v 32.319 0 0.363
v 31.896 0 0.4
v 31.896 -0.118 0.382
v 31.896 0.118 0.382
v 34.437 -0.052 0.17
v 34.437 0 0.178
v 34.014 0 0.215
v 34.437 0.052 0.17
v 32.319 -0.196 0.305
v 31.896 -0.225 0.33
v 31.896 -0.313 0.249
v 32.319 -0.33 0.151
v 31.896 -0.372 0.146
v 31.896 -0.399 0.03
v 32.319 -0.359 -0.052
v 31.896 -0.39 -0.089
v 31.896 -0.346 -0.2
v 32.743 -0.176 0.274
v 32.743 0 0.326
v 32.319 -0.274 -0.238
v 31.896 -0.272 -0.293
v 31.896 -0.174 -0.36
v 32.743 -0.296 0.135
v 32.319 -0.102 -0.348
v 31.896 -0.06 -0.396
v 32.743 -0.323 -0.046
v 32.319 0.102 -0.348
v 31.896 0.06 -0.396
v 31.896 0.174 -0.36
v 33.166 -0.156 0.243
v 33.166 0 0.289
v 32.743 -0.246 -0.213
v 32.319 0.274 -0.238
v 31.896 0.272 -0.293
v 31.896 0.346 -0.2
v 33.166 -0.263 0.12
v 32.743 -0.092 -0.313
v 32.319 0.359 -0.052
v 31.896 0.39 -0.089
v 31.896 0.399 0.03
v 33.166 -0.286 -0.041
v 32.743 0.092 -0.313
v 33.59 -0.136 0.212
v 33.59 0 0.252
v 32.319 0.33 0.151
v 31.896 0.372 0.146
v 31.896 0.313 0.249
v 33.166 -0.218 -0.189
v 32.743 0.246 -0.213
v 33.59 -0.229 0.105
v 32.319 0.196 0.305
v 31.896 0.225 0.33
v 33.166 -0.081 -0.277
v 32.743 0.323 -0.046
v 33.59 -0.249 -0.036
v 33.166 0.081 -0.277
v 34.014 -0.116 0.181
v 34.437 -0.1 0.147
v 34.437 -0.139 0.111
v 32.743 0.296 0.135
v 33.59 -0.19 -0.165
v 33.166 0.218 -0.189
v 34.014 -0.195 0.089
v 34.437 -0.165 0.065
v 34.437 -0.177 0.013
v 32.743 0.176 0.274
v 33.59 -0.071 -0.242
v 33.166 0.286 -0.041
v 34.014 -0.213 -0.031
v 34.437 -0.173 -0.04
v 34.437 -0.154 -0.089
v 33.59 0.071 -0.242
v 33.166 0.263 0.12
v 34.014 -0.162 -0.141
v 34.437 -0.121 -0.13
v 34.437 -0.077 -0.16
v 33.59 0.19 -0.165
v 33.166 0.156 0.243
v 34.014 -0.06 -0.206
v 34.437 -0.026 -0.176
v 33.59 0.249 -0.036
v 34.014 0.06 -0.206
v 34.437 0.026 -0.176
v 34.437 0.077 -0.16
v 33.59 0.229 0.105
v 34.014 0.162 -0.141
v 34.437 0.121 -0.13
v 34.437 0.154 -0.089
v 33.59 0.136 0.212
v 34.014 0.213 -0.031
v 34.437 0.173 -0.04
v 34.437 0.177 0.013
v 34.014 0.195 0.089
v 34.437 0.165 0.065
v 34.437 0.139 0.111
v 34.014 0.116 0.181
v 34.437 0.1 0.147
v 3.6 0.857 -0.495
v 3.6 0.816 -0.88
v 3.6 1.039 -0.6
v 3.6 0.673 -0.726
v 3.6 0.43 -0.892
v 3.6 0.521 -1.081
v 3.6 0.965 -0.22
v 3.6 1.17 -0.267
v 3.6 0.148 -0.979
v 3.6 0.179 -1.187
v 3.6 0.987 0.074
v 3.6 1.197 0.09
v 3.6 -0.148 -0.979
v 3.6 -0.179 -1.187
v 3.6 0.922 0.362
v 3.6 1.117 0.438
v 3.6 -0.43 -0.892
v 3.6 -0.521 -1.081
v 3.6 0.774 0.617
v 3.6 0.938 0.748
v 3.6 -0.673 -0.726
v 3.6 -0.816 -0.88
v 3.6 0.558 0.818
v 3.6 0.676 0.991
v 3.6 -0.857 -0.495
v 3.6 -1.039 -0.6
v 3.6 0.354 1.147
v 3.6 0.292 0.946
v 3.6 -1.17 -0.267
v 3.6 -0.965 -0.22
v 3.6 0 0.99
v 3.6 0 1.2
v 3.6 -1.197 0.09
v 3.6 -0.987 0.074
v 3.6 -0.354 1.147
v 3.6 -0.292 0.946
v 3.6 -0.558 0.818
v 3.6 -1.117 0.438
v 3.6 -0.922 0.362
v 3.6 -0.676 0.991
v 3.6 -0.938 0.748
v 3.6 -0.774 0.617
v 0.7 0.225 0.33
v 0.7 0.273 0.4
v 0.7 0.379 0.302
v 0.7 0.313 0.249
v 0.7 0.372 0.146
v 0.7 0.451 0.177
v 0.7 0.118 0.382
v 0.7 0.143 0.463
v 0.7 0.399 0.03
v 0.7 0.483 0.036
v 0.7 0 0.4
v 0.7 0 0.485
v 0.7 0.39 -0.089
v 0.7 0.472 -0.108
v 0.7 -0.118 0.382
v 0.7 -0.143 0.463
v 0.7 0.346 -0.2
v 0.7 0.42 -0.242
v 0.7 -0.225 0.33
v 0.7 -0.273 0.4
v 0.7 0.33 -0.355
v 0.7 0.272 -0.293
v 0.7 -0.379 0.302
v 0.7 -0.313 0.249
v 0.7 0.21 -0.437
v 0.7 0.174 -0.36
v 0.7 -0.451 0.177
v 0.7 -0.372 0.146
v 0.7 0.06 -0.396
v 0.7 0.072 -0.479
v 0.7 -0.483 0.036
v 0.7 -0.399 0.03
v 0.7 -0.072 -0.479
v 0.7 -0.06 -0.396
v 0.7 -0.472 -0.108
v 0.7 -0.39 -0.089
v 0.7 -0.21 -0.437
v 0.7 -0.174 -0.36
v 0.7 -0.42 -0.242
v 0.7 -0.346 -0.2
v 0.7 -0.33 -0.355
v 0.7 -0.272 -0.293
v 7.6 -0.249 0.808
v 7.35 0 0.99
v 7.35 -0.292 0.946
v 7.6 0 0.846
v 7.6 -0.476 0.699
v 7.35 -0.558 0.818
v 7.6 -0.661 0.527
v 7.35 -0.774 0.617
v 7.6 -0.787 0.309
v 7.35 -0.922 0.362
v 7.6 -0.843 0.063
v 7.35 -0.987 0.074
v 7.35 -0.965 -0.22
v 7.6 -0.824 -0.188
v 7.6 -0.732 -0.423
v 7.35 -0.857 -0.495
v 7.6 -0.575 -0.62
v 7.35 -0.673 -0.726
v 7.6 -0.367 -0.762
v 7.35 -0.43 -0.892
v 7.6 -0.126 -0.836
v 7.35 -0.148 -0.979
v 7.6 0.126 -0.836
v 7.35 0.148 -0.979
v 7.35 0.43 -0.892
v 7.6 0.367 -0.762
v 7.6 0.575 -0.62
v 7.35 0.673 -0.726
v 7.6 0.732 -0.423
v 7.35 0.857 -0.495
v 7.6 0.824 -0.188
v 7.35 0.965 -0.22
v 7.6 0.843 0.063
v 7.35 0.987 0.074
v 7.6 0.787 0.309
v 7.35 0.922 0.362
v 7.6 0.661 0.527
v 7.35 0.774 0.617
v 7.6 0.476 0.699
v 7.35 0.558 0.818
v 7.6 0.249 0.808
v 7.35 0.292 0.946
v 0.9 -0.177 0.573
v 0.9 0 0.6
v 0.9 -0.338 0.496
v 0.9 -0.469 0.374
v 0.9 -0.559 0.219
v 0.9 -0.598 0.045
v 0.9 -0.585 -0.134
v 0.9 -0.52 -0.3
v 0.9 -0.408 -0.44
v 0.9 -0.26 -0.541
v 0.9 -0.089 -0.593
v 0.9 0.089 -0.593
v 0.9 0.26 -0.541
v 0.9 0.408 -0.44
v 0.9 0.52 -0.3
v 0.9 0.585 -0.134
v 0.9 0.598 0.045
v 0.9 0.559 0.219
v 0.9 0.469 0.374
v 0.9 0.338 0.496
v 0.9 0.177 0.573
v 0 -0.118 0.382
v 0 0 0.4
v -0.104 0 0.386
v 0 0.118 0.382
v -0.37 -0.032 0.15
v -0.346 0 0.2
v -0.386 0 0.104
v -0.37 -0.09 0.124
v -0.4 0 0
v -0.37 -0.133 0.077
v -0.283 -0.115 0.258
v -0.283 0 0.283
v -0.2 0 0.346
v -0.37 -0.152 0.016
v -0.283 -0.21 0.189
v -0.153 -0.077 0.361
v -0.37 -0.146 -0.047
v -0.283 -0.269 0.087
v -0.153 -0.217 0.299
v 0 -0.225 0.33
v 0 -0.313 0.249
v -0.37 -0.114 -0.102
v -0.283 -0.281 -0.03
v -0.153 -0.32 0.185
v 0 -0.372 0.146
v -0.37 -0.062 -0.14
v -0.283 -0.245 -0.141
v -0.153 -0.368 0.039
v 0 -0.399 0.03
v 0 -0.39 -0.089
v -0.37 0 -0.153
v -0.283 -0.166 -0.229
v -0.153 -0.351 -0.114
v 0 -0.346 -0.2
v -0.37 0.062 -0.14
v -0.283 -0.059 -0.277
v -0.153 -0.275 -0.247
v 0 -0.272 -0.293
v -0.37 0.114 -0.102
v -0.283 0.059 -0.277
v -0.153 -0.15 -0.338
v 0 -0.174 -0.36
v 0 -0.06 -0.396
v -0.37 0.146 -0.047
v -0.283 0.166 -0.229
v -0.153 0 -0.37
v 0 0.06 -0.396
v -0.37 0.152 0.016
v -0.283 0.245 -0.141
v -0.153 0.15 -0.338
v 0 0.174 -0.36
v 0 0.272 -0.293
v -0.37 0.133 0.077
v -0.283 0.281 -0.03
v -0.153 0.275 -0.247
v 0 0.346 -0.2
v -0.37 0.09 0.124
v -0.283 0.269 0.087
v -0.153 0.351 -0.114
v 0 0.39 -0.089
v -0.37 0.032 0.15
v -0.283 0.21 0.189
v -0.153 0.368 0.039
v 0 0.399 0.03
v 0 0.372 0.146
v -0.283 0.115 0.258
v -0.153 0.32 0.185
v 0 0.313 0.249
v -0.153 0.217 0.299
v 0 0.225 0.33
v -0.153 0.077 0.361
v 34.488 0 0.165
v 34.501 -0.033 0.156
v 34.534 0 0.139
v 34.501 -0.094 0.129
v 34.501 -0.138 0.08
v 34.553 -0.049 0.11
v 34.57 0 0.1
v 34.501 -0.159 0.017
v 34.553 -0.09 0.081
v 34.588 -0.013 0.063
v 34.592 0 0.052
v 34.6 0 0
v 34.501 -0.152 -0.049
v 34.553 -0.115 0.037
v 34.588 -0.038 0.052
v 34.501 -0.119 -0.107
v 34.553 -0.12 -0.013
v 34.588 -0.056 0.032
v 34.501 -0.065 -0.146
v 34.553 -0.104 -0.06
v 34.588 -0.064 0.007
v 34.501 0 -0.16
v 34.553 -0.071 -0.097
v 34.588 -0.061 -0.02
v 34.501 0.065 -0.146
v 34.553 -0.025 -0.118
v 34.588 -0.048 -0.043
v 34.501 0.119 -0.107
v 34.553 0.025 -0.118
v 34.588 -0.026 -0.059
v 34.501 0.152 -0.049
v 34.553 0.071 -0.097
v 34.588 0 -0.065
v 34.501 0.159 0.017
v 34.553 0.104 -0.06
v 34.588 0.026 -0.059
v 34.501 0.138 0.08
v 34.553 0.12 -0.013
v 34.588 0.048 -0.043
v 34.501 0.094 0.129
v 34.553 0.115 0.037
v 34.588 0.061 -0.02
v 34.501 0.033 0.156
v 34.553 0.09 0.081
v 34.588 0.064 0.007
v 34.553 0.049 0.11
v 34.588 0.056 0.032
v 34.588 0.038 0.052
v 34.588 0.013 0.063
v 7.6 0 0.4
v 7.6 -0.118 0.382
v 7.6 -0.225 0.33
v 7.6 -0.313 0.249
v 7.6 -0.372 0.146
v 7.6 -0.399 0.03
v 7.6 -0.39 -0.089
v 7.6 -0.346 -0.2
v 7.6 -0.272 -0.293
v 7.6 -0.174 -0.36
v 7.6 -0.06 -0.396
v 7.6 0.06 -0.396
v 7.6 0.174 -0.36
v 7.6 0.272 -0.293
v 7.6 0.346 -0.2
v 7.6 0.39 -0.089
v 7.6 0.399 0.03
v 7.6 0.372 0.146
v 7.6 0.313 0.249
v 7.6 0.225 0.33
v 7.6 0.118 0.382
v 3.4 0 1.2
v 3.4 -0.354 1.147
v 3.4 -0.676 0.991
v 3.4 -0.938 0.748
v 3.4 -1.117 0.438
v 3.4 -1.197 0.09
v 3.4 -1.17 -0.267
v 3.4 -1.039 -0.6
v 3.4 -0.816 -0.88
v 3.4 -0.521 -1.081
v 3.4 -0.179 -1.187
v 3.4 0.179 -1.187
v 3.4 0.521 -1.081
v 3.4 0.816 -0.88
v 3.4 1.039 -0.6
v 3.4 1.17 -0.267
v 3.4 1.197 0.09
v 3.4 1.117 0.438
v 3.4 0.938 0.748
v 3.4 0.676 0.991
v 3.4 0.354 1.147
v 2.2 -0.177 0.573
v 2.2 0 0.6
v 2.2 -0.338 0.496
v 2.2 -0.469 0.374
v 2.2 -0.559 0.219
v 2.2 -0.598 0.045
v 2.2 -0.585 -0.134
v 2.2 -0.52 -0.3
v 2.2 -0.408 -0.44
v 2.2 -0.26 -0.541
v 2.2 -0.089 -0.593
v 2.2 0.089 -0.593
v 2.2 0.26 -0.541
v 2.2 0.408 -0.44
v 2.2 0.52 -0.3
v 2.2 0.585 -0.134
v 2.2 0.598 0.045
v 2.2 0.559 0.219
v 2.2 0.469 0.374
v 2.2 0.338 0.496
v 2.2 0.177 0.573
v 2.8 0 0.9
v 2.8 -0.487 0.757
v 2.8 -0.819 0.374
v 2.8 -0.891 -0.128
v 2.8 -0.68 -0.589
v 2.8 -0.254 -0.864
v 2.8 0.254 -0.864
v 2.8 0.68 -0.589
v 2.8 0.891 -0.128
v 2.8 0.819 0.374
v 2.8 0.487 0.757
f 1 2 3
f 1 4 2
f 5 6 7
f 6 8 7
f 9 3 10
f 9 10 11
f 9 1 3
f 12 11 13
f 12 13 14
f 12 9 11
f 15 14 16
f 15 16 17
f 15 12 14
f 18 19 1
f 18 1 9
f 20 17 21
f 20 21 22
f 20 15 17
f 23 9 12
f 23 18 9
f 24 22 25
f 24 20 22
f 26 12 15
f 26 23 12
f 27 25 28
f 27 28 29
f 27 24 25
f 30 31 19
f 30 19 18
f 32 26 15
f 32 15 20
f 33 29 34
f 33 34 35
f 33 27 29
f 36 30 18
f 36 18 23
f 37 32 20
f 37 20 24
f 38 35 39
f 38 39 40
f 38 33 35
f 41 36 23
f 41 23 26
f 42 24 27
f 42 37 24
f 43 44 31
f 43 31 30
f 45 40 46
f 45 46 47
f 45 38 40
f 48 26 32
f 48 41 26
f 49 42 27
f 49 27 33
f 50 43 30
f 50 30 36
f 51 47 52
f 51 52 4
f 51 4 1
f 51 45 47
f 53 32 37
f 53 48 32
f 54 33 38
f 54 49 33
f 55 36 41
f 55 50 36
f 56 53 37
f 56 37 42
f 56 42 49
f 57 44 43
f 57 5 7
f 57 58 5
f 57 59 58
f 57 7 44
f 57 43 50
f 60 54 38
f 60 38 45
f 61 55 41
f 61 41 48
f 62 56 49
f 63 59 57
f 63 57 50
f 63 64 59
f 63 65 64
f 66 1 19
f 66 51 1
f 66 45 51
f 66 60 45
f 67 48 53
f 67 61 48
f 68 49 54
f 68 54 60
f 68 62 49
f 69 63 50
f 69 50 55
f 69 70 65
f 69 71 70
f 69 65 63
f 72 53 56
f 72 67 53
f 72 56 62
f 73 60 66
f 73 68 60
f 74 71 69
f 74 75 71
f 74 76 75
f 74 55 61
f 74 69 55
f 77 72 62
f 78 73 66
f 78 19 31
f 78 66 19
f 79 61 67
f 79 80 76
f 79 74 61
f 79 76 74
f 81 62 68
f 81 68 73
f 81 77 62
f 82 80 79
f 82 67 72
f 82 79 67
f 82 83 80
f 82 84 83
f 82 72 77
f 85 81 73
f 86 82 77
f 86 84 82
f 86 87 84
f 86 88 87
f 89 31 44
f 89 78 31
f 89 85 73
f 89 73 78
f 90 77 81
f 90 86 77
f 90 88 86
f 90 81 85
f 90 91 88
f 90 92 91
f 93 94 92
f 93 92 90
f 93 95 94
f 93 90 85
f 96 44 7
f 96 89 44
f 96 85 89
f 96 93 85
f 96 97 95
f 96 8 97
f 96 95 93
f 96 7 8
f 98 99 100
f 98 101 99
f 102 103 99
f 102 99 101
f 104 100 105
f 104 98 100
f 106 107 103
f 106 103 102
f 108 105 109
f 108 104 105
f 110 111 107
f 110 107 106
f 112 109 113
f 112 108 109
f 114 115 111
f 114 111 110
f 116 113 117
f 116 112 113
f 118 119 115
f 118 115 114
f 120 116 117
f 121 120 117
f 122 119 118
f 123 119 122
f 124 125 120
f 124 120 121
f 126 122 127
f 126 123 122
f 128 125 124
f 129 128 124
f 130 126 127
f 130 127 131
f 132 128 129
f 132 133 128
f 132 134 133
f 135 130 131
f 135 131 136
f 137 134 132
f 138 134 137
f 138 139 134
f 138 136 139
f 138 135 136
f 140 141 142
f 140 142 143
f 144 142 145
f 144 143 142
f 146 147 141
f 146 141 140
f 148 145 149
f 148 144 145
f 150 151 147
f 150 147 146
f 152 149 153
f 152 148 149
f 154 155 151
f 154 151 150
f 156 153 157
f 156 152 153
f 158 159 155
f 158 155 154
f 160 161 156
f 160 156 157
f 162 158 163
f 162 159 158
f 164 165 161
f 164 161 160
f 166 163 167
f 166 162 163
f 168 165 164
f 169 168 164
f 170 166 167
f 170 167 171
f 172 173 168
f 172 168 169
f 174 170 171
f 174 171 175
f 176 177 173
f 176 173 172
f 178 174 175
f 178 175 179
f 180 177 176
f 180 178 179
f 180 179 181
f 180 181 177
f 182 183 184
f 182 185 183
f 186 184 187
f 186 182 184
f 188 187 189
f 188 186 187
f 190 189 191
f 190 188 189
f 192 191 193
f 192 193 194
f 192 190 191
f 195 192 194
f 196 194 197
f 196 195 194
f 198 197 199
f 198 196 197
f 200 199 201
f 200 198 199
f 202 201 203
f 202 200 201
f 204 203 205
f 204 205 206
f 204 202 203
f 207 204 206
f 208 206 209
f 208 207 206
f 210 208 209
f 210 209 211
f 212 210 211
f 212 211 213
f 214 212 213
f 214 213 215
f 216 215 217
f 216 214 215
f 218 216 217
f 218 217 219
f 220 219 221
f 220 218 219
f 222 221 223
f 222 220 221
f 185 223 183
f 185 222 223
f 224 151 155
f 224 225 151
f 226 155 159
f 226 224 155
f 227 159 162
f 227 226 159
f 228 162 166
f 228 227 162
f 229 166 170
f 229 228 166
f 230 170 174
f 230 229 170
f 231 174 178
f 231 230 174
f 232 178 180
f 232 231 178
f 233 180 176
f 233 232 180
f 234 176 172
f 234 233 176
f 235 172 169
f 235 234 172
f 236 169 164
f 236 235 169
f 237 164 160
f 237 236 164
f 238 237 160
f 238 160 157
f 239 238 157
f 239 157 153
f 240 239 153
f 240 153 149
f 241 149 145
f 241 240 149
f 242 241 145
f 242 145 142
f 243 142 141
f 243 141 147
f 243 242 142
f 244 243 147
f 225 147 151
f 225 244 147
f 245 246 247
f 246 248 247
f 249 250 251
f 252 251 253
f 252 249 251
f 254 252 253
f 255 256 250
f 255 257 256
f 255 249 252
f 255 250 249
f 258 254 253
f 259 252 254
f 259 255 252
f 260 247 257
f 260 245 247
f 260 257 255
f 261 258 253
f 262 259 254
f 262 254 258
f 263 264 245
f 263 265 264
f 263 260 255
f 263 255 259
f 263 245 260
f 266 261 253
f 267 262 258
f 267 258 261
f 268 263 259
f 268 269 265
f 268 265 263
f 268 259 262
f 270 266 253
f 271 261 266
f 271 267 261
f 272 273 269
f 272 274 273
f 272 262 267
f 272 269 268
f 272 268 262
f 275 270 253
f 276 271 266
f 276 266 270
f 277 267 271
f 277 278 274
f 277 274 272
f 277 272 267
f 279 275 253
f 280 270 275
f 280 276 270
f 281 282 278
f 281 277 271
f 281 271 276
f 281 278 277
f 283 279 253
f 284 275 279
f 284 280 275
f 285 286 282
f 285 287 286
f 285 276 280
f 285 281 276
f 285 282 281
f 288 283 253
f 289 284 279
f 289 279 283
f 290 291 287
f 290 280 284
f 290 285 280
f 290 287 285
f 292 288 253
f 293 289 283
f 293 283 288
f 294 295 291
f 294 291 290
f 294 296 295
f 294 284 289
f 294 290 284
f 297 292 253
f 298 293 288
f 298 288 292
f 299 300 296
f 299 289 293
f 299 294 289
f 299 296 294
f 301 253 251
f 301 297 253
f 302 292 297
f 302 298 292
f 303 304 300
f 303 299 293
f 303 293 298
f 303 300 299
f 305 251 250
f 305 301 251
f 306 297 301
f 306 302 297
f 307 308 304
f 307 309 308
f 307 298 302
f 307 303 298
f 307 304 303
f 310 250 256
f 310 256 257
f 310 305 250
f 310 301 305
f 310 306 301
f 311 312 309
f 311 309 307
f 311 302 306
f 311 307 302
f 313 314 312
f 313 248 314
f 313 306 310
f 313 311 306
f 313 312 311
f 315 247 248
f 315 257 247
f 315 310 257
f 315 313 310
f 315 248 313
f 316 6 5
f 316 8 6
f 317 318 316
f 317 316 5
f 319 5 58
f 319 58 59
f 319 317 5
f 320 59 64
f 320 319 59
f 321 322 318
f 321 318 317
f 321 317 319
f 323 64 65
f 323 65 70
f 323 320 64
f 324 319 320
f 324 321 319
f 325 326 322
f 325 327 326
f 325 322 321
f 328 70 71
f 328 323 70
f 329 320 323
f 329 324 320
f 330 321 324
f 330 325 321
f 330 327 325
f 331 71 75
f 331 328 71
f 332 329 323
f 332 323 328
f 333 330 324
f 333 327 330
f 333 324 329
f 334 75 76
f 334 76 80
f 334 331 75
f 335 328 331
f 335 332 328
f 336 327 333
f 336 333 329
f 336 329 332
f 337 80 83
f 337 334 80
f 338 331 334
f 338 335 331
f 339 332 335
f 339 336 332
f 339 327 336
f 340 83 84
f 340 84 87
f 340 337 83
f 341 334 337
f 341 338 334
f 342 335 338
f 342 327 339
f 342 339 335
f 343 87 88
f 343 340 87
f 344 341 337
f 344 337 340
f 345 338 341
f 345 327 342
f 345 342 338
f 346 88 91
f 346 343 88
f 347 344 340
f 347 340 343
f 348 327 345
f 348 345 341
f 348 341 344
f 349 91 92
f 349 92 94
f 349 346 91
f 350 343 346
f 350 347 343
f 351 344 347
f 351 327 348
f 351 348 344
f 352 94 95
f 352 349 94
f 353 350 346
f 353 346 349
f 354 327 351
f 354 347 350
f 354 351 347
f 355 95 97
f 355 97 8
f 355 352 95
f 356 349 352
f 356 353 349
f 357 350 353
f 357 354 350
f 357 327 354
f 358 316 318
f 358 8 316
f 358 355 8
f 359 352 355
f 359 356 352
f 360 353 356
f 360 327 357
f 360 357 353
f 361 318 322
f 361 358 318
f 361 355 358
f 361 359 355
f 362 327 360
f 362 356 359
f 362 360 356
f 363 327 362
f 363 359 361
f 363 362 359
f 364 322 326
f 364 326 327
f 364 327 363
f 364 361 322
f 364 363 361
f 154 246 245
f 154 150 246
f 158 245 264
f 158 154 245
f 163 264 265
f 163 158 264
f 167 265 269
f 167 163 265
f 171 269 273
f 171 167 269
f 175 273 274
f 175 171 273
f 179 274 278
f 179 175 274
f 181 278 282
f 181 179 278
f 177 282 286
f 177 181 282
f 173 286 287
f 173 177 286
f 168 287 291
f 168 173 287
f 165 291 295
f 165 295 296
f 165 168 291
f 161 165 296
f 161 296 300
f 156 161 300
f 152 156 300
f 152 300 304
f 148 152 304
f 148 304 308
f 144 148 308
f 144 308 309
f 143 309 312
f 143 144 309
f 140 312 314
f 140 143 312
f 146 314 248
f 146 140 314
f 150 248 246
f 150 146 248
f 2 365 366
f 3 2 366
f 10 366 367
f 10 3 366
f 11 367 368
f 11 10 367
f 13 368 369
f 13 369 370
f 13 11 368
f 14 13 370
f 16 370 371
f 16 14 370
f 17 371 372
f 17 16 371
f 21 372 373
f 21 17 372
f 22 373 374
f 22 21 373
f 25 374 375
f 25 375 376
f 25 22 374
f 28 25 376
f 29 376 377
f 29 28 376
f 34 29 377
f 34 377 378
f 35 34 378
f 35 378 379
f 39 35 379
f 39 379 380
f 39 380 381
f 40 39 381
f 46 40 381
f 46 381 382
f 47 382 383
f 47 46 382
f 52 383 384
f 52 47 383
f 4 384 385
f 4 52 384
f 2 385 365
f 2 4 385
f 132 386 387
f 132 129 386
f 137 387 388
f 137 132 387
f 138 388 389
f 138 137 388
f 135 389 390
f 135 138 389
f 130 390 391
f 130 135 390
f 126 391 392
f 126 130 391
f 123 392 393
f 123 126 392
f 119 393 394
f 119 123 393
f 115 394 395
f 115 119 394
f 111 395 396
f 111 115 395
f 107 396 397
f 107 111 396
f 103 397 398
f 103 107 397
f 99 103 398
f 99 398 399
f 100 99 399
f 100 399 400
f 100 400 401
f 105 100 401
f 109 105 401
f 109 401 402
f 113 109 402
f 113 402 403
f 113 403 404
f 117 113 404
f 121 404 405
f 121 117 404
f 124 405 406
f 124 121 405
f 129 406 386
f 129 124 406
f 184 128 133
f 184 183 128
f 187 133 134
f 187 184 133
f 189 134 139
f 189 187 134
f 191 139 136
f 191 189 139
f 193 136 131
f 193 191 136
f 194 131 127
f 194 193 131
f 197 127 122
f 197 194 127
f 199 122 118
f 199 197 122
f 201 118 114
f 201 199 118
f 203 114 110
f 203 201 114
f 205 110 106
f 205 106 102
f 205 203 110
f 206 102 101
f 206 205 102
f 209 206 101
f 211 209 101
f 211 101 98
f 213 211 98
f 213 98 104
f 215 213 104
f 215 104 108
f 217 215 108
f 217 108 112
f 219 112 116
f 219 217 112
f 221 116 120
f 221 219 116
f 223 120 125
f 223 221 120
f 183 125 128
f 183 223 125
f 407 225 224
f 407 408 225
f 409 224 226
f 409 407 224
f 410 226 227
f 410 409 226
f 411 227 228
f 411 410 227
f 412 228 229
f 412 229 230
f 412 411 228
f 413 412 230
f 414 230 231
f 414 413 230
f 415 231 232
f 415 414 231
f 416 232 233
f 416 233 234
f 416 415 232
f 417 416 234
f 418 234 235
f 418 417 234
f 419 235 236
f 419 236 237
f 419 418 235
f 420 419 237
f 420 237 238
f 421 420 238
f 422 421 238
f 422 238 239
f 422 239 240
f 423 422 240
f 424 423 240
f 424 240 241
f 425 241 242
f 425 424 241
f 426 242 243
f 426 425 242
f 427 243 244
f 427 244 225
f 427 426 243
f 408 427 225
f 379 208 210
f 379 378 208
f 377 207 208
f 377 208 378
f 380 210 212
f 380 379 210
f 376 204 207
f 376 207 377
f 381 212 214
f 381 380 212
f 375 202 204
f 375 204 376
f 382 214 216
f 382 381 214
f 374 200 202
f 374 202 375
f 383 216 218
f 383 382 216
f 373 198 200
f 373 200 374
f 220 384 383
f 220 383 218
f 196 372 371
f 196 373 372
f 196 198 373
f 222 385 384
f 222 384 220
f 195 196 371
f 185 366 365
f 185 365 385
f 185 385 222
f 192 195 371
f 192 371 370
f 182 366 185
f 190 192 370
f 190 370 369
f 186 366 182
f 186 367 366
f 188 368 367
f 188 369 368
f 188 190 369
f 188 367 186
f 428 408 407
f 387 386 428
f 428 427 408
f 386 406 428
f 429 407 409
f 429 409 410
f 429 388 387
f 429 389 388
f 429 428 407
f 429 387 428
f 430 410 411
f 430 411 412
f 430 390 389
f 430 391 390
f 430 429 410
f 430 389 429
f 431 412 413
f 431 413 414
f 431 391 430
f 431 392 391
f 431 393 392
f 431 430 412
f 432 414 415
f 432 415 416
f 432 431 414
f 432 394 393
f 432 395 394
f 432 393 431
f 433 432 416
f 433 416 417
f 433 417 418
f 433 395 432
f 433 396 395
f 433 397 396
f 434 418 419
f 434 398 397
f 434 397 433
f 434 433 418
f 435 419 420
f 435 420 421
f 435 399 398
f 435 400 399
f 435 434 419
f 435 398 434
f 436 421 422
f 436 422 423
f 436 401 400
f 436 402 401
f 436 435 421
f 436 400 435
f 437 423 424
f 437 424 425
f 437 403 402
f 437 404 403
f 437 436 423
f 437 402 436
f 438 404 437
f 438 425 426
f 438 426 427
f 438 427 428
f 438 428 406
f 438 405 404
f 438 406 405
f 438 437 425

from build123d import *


with BuildPart() as part:
    # Esboço1 → Revolução1 (revolve)
    with BuildSketch(Plane.XY, mode=Mode.PRIVATE) as revolu_o1_sk:
        with BuildLine():
            Line((0, 0.4), (0.7, 0.4))
            Line((0.7, 0.4), (0.7, 0.484529946))
            Line((0.7, 0.484529946), (0.9, 0.6))
            Line((0.9, 0.6), (2.2, 0.6))
            Line((2.2, 0.6), (3.4, 1.2))
            Line((3.4, 1.2), (3.6, 1.2))
            Line((3.6, 1.2), (3.6, 0.99))
            Line((3.6, 0.99), (7.35, 0.99))
            Line((7.35, 0.99), (7.6, 0.845662433))
            Line((7.6, 0.845662433), (7.6, 0.4))
            Line((7.6, 0.4), (31.895599944, 0.4))
            Line((31.895599944, 0.4), (34.437226116, 0.177636523))
            ThreePointArc((34.437226116, 0.177636523), (34.553152591, 0.120467912), (34.6, 0))
            Line((34.6, 0), (-0.4, 0))
            ThreePointArc((-0.4, 0), (-0.282842712, 0.282842712), (0, 0.4))
        make_face()
    revolve(revolu_o1_sk.sketch.rotate(Axis((-0.4, 0, 0), (1, 0, 0)), 90), axis=Axis((-0.4, 0, 0), (1, 0, 0)))


solid = part.part
